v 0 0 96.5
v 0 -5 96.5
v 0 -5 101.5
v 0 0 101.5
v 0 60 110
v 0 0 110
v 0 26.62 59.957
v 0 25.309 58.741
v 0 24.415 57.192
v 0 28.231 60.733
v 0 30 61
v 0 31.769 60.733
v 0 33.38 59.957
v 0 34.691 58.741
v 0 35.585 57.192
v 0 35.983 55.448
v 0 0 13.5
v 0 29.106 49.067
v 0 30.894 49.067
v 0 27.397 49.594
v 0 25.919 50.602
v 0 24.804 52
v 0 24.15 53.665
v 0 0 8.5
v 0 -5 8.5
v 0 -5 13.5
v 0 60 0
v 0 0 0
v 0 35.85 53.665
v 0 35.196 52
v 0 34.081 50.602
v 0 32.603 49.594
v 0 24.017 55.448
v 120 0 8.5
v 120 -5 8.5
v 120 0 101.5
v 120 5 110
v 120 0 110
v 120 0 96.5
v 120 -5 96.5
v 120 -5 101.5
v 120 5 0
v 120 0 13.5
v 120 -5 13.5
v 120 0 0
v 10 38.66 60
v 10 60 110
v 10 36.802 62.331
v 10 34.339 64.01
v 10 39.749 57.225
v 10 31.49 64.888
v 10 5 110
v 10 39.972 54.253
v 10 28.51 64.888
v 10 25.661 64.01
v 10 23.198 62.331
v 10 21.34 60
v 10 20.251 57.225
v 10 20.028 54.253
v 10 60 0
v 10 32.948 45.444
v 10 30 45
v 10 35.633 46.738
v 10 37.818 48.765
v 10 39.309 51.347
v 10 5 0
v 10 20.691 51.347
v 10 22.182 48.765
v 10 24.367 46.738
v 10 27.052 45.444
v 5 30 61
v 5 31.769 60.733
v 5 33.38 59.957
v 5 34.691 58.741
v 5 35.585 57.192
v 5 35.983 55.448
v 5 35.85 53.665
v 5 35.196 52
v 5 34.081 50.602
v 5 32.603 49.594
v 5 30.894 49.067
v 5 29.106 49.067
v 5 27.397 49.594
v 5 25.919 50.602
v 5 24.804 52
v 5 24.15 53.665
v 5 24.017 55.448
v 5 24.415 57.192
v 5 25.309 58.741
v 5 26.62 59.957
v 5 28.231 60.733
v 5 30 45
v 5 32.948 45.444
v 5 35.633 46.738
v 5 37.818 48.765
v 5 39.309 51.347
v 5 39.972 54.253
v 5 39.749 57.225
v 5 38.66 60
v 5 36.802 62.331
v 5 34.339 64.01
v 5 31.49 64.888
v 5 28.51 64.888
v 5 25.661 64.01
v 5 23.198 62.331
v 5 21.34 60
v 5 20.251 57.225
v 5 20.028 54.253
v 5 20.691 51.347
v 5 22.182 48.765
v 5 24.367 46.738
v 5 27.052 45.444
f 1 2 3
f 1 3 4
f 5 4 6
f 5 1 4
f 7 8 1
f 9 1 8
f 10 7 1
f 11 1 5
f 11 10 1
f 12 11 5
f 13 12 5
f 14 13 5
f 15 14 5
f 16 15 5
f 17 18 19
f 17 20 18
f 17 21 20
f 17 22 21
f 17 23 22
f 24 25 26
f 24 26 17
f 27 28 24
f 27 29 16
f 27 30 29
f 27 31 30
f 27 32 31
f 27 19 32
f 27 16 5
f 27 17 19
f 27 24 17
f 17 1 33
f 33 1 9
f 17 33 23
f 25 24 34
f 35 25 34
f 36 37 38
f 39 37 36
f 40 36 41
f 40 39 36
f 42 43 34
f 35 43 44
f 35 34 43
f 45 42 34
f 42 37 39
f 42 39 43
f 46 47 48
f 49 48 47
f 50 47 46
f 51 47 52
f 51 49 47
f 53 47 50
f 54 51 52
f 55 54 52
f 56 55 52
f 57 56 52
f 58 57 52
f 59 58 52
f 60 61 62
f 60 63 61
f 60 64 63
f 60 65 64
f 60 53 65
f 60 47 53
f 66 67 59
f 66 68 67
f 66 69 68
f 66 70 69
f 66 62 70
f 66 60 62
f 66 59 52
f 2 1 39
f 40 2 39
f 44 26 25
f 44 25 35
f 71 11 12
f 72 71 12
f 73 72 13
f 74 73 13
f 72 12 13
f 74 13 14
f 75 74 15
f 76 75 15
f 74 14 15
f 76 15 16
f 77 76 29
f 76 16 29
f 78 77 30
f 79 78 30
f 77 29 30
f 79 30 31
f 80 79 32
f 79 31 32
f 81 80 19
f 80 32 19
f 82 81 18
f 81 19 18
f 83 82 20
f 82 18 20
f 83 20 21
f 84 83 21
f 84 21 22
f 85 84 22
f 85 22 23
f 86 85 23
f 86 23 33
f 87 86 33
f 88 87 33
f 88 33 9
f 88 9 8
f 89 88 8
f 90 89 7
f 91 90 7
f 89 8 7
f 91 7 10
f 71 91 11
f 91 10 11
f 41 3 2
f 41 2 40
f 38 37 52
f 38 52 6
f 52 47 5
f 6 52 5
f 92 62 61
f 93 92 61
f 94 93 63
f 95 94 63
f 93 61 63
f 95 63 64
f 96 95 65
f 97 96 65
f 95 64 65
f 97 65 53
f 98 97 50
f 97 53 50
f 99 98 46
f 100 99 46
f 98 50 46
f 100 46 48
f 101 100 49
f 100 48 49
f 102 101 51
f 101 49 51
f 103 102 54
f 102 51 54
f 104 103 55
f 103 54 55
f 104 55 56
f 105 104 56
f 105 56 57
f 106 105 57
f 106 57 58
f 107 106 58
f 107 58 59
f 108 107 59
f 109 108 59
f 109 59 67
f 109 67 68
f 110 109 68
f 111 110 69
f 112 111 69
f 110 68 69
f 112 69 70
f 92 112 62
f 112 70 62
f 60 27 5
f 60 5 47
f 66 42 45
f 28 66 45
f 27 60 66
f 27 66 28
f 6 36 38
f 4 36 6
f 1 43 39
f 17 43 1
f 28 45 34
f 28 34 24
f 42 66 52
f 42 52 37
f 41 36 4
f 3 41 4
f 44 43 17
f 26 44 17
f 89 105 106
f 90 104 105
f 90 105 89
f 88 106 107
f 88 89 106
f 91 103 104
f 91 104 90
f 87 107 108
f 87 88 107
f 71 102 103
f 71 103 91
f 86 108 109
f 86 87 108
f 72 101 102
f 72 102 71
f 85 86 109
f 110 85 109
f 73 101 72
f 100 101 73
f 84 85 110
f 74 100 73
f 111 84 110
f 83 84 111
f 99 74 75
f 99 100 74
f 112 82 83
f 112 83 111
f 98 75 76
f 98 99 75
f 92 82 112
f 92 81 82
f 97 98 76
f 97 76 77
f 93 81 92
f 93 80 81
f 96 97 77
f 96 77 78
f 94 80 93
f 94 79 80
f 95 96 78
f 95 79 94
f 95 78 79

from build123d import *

# Parameters (mm, degrees)
BOSS_EXTRUDE2_DEPTH = 110
BOSS_EXTRUDE3_DEPTH = 5
SKETCH4_R           = 6
CUT_EXTRUDE1_DEPTH  = 5
SKETCH5_R           = 10
CUT_EXTRUDE2_DEPTH  = 5


with BuildPart() as part:
    # Sketch2 → Boss-Extrude2 (new body)
    with BuildSketch(Plane.XY):
        Polygon((0, 0), (0, 60), (10, 60), (10, 5), (120, 5), (120, 0), align=None)
    extrude(amount=BOSS_EXTRUDE2_DEPTH)

    # Sketch3 → Boss-Extrude3 (add)
    with BuildSketch(Plane.XZ):
        Polygon((60, 101.5), (0, 101.5), (0, 96.5), (120, 96.5), (120, 101.5), align=None)
        Polygon((120, 13.5), (0, 13.5), (0, 8.5), (60, 8.5), (120, 8.5), align=None)
    extrude(amount=BOSS_EXTRUDE3_DEPTH)

    # Sketch4 → Cut-Extrude1 (cut)
    with BuildSketch(Plane.ZY):
        with Locations((55, 30)):
            Circle(SKETCH4_R)
    extrude(amount=-CUT_EXTRUDE1_DEPTH, mode=Mode.SUBTRACT)

    # Sketch5 → Cut-Extrude2 (cut)
    with BuildSketch(Plane(origin=(10, 0, 0), x_dir=(0, 0, -1), z_dir=(1, 0, 0))):
        with Locations((-55, 30)):
            Circle(SKETCH5_R)
    extrude(amount=-CUT_EXTRUDE2_DEPTH, mode=Mode.SUBTRACT)


solid = part.part
